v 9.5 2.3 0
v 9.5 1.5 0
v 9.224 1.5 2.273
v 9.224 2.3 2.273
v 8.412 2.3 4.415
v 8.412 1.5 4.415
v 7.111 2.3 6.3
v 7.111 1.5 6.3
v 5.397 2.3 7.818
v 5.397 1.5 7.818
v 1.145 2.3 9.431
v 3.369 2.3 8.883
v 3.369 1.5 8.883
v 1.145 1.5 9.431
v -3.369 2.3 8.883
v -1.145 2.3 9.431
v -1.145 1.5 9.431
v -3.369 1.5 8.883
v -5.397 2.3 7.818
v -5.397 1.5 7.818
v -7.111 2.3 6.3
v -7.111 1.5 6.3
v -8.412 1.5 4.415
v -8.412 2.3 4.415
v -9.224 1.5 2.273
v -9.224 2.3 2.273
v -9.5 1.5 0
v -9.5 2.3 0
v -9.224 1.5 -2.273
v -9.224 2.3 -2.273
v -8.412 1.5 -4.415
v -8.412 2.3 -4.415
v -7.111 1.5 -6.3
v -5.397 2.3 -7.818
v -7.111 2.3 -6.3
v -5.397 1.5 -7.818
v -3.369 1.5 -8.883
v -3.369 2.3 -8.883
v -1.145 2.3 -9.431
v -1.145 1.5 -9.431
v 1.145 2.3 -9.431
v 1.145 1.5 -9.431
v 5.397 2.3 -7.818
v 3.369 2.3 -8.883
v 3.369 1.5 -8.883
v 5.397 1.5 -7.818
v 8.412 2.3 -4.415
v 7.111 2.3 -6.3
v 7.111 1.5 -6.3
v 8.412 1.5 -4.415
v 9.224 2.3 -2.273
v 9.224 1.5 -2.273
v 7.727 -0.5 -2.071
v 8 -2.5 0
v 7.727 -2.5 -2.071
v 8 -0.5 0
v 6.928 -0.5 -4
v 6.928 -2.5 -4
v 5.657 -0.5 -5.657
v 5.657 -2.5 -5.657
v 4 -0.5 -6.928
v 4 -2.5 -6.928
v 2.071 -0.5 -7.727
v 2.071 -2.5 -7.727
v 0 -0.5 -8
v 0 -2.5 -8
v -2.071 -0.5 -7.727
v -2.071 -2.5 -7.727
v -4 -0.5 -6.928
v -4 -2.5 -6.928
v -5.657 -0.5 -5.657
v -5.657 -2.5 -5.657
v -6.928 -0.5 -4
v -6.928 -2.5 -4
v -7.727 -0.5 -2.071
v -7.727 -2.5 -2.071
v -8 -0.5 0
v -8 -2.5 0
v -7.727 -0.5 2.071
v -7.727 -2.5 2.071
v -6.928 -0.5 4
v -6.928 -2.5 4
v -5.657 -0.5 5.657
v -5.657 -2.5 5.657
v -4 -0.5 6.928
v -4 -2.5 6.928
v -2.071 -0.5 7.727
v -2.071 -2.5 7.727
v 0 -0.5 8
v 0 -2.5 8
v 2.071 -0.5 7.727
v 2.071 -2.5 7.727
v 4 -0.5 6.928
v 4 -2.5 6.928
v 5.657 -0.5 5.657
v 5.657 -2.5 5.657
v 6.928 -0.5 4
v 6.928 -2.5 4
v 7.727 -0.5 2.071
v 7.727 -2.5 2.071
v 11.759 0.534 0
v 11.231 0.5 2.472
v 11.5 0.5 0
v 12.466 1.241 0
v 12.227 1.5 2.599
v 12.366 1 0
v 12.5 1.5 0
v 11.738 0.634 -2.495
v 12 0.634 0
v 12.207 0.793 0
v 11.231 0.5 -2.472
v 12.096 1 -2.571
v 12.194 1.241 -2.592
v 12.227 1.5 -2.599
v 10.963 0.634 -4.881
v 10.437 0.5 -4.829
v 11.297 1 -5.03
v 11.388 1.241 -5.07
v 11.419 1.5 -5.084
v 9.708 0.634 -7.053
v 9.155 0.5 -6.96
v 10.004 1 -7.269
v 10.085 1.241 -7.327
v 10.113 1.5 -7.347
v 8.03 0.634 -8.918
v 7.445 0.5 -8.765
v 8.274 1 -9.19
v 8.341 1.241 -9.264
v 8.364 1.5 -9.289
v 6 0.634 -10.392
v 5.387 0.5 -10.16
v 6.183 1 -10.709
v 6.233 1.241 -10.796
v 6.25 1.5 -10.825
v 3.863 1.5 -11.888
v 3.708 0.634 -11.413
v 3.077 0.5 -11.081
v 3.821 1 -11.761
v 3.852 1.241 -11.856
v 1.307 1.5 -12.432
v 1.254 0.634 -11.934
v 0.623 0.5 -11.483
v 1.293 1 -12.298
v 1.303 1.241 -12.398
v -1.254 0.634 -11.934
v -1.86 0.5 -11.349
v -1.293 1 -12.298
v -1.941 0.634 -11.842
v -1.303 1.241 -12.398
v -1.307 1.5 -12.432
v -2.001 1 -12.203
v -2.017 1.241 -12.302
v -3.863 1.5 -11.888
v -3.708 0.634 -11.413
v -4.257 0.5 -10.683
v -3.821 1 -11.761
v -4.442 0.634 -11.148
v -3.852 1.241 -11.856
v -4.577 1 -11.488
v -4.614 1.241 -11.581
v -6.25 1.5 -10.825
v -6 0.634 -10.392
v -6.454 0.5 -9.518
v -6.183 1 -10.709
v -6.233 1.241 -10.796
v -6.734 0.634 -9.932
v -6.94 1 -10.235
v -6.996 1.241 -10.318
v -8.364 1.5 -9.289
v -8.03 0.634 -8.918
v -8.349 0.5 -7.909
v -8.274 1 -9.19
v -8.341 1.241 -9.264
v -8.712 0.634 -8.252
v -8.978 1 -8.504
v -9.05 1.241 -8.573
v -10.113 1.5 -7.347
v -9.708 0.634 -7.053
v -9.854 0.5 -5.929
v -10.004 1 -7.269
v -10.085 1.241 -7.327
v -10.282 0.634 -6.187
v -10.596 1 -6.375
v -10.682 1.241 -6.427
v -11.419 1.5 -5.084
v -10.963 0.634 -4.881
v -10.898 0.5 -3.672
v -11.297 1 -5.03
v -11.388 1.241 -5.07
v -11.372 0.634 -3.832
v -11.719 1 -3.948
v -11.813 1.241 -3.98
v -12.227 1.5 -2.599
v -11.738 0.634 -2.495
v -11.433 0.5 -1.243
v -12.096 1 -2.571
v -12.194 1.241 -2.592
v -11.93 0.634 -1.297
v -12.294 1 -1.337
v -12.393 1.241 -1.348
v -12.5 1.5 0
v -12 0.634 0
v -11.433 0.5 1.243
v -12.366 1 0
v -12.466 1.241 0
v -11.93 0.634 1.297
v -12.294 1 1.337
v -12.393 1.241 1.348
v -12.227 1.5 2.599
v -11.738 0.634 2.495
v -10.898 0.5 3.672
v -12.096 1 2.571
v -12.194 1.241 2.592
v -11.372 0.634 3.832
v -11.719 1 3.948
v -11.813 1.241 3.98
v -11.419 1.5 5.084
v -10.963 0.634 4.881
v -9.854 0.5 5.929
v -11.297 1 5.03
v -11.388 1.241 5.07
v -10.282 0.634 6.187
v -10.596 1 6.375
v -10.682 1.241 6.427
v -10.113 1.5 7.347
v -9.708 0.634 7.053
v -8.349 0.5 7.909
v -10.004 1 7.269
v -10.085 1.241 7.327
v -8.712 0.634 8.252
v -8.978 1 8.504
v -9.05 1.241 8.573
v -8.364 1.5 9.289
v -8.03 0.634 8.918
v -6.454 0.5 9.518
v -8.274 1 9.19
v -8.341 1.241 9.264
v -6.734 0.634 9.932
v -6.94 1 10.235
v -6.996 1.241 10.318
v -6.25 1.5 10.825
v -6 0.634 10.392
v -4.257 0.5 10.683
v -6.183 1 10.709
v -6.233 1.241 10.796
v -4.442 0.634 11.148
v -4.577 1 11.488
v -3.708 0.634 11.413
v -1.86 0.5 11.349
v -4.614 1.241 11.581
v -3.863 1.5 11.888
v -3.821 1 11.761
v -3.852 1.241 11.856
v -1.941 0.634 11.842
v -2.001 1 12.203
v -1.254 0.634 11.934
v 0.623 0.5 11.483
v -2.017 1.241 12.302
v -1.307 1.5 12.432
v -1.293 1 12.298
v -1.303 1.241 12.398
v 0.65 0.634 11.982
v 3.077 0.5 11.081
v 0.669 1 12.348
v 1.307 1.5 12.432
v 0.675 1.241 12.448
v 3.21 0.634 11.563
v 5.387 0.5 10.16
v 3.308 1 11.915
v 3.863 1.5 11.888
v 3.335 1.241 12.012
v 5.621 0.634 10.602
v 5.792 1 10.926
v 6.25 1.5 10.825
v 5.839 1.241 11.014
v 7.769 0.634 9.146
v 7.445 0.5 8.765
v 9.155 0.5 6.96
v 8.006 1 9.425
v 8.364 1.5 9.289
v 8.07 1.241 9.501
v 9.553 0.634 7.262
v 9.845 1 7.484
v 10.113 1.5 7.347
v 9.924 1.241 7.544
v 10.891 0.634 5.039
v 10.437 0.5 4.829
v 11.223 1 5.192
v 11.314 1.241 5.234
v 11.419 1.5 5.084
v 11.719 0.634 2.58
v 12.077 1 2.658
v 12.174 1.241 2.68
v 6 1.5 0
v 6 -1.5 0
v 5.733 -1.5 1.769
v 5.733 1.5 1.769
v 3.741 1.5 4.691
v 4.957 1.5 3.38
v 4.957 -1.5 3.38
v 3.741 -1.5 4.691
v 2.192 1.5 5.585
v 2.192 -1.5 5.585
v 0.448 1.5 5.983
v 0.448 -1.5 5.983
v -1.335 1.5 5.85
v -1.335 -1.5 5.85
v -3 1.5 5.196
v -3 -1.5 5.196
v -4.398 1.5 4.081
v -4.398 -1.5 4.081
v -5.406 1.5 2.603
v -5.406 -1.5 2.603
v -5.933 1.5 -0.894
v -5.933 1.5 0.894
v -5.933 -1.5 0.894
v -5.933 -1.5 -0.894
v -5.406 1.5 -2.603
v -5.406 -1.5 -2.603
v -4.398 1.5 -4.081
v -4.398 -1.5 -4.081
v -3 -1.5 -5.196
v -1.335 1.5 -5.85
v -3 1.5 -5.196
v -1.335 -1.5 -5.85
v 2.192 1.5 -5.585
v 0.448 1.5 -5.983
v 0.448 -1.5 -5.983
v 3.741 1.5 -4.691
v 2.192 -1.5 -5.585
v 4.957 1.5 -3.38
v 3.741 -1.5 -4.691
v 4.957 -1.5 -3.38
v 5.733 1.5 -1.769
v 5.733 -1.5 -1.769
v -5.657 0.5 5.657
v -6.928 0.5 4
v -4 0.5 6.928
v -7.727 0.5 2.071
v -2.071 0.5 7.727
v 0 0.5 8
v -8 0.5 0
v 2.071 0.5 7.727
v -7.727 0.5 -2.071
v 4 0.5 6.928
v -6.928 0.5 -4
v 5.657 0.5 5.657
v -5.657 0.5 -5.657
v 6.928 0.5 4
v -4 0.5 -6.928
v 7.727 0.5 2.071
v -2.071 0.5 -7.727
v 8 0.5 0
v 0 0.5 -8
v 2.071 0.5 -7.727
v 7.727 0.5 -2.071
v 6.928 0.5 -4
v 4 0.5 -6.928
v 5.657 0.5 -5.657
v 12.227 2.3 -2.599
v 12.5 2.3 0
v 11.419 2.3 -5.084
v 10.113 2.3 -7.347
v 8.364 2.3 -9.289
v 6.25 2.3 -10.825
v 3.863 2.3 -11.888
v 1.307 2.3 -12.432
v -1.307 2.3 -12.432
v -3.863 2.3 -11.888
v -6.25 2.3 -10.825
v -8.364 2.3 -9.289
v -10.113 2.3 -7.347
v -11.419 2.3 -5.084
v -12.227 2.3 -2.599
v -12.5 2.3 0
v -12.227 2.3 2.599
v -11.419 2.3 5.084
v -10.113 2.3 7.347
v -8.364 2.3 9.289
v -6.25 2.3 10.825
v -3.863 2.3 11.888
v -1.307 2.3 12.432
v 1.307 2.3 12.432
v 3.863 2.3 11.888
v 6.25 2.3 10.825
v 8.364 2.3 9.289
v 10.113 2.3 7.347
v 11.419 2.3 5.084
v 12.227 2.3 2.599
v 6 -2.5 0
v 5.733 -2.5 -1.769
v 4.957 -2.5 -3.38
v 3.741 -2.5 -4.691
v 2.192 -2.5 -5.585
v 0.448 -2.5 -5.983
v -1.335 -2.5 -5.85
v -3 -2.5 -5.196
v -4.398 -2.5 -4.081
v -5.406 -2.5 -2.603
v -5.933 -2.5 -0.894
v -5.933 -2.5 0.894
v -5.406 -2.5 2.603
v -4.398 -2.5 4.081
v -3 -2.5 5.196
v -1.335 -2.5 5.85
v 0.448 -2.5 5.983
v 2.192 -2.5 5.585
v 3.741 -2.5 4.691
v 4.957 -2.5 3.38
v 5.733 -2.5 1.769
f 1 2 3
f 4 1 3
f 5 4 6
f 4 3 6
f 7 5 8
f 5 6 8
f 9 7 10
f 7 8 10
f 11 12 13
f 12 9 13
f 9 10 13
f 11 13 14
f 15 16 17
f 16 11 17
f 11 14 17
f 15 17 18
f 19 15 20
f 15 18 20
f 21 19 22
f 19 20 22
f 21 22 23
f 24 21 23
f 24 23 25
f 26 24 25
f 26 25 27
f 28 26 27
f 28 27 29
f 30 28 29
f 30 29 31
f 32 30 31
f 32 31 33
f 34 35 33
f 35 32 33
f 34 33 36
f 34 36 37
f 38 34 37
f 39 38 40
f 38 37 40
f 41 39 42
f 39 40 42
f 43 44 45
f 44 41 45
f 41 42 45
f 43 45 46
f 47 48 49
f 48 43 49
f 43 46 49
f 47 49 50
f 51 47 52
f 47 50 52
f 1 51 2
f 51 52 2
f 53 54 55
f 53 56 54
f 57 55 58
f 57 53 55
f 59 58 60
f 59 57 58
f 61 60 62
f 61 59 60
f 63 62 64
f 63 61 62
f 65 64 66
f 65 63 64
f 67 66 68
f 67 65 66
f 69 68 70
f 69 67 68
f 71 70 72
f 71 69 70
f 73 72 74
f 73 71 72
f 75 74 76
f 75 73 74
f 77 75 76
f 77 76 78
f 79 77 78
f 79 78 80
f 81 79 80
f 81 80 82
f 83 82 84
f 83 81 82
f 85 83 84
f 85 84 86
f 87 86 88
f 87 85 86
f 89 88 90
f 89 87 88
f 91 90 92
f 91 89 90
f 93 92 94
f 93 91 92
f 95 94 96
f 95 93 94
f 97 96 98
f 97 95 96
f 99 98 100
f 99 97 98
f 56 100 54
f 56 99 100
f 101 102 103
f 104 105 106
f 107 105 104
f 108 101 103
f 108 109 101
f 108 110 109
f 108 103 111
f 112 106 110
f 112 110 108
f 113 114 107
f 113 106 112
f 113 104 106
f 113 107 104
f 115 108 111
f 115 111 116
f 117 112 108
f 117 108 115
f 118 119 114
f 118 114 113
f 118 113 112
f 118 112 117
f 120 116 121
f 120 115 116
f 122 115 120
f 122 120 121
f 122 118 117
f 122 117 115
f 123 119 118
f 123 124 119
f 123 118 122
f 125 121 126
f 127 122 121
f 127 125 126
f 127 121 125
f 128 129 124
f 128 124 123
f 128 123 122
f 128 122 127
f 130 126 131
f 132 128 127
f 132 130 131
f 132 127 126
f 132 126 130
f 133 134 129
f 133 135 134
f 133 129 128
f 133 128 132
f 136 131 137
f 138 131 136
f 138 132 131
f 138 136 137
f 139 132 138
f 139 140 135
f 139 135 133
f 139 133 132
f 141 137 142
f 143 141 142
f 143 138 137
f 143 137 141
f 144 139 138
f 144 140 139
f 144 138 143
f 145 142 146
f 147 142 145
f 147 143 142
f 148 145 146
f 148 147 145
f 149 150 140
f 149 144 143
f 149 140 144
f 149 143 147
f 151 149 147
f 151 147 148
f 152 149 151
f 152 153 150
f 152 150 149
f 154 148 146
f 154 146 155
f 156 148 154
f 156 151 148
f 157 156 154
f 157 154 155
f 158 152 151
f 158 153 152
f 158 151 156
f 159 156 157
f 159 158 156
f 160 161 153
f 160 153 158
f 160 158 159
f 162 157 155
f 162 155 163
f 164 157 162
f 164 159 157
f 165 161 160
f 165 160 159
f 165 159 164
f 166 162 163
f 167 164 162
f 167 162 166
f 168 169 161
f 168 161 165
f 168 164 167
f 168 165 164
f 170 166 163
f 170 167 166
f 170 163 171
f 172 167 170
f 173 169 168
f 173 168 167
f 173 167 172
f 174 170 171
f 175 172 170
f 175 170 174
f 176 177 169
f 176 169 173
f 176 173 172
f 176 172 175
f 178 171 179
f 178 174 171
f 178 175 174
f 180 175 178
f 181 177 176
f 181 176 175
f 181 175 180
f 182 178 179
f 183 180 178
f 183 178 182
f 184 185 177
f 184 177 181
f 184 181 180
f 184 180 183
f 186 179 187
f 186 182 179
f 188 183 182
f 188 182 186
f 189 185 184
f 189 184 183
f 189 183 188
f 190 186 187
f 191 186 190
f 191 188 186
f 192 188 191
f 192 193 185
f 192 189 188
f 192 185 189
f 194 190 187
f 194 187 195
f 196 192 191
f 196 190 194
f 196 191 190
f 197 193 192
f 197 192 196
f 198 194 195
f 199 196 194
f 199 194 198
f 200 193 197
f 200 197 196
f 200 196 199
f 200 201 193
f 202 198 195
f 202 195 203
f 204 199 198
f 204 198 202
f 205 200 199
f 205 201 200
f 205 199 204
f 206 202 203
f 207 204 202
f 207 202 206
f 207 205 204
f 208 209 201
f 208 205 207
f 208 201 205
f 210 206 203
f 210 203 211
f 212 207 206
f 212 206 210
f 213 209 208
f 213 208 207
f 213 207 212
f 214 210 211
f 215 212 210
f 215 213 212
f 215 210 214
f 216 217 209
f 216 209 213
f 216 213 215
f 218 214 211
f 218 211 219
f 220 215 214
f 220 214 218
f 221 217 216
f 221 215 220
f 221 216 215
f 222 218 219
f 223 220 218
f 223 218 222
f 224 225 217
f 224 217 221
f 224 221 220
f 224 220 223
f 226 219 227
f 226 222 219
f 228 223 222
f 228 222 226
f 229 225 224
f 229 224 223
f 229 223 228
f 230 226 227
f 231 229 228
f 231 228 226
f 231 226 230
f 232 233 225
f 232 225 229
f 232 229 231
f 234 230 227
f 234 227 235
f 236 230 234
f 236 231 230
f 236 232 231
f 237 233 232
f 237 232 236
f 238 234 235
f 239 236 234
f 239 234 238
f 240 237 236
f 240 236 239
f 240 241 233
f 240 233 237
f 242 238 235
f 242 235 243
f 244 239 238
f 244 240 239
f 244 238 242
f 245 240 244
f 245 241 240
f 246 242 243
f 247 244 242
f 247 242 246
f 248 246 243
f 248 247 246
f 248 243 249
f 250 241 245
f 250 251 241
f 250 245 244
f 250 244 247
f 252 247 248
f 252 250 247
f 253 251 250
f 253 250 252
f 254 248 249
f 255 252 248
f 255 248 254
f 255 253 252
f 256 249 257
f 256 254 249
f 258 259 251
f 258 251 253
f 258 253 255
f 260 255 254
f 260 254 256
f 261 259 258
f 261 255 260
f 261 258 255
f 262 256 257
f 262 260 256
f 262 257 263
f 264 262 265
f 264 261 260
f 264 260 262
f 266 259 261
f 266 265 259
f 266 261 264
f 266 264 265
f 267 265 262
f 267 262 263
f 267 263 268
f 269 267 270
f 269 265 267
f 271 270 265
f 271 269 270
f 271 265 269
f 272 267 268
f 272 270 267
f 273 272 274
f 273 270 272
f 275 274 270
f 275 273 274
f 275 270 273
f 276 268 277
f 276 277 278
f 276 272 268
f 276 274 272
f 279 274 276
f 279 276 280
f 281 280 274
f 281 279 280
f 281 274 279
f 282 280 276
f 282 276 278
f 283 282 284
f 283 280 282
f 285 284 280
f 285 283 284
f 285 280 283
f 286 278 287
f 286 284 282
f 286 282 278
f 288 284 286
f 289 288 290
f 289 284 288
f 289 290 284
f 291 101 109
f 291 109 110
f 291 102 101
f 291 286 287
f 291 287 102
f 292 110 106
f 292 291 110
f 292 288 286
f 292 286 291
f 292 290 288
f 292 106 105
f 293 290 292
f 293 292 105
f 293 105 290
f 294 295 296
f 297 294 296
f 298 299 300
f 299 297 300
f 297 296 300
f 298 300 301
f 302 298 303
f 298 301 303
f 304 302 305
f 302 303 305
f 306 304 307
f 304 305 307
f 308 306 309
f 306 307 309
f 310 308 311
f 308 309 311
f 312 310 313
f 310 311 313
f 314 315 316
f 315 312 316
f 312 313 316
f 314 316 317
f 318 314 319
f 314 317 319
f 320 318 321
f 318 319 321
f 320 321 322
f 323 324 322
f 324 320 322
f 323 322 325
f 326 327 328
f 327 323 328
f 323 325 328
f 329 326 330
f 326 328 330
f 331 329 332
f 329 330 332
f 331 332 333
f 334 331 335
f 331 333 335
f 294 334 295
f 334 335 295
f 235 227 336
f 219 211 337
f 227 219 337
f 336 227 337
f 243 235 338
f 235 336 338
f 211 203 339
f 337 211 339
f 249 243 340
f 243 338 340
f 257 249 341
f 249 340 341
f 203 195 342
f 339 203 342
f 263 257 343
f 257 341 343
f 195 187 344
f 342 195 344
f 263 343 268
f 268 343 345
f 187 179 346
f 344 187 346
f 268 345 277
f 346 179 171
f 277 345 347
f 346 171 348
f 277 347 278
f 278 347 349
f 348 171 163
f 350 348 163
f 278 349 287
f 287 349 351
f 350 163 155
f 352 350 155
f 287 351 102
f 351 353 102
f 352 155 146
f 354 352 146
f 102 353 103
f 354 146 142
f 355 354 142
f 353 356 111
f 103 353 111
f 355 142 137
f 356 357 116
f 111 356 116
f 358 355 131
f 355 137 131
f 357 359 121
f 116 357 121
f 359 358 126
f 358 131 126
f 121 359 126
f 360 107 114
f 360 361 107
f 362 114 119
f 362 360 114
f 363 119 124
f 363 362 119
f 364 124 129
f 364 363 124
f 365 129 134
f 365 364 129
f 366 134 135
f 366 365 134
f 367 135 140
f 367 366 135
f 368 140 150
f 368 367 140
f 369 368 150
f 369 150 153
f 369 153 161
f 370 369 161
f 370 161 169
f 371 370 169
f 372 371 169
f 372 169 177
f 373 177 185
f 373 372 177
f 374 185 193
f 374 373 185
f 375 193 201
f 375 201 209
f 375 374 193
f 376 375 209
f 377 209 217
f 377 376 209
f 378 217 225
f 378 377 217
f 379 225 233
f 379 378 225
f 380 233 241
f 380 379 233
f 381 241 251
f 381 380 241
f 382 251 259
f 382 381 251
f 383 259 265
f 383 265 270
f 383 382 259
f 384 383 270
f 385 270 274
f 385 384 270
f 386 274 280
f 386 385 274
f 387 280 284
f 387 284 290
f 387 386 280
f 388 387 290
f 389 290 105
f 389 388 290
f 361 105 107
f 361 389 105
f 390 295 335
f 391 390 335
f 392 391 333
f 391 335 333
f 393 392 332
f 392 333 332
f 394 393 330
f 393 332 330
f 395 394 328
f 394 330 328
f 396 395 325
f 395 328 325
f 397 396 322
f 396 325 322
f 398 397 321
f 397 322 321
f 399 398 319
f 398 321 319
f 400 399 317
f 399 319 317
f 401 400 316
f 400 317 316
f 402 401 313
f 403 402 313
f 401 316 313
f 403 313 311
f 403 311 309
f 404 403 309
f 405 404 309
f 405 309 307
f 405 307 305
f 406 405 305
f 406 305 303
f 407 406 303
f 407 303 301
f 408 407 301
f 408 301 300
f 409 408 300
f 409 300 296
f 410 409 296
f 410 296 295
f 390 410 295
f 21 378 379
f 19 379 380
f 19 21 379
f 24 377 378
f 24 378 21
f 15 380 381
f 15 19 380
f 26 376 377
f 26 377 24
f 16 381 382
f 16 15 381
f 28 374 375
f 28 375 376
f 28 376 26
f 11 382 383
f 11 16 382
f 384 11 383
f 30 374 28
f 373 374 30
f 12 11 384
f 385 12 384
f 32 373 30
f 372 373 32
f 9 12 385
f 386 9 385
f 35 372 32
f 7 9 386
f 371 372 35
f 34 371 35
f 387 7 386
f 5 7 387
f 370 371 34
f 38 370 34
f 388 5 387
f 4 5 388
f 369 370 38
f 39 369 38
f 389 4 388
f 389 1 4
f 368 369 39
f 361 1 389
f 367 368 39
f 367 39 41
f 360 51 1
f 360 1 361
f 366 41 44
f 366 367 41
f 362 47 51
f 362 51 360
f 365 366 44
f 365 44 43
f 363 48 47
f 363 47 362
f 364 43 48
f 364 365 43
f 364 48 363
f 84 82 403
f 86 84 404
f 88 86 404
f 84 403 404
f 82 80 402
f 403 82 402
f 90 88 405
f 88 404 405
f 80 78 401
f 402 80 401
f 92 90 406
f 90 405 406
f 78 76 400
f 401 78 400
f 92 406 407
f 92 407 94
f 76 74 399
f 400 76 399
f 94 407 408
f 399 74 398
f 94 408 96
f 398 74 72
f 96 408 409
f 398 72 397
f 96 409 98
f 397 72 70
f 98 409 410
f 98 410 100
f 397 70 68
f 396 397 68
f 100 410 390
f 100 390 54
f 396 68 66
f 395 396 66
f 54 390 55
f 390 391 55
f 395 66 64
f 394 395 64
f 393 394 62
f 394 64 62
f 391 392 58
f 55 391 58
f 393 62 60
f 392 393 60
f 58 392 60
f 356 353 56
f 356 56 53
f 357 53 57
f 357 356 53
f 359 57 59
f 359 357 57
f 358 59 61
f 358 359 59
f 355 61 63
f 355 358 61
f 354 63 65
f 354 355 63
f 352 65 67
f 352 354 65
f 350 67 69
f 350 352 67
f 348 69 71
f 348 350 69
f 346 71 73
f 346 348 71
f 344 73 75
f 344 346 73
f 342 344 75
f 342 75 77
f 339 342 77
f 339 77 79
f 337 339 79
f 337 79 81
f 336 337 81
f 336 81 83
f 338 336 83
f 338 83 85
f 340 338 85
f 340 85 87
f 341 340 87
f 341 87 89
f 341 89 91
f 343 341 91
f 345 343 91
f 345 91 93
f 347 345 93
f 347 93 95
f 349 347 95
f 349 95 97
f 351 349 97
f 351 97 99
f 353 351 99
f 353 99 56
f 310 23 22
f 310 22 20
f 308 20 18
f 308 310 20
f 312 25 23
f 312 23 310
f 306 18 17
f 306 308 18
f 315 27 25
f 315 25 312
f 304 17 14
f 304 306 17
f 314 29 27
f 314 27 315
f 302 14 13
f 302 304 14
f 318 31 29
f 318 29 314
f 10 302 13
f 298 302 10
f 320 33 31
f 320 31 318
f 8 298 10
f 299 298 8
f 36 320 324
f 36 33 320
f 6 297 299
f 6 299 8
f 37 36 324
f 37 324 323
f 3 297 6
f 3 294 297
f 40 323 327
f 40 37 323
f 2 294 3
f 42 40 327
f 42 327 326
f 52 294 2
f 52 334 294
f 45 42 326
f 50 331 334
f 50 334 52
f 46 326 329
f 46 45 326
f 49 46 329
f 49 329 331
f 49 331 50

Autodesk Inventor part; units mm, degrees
ref_plane "YZ Plane" through (0, 0, 0) normal (1, 0, 0) x (0, 1, 0)
ref_plane "XZ Plane" through (0, 0, 0) normal (0, 1, 0) x (-1, 0, 0)
ref_plane "XY Plane" through (0, 0, 0) normal (0, 0, 1) x (1, 0, 0)
sketch "Sketch1" plane through (0, 0, 0) normal (0, 0, 1) x (1, 0, 0)
  line L0 (6, 1.5) -> (6, -1.5)
  line L1 (8, 0.5) -> (11.5, 0.5)
  line L2 (12.5, 1.5) -> (12.5, 2.3)
  line L3 (12.5, 1.5) -> (11.5, 1.5) construction
  line L4 (11.5, 1.5) -> (11.5, 0.5) construction
  arc A0 (11.5, 0.5) -> (12.5, 1.5) centre (11.5, 1.5) ccw
  line L5 (6, 1.5) -> (9.5, 1.5)
  line L6 (12.5, 2.3) -> (9.5, 2.3)
  line L7 (9.5, 2.3) -> (9.5, 1.5)
  line L8 (8, -0.5) -> (8, 0.5)
  line L9 (6, -2.5) -> (8, -2.5)
  line L10 (8, -2.5) -> (8, -0.5)
  line L11 (0, 0) -> (0, 11.9081) construction
  line L12 (6, -2.5) -> (6, -1.5)
  dimension "d0" = 3
  dimension "d1" = 1.5
  dimension "d2" = 0.8
  dimension "d3" = 1
  dimension "d4" = 1
  dimension "d5" = 3
  dimension "d6" = 6
  dimension "d7" = 0.8
  dimension "d8" = 3.5
  dimension "d11" = 1
revolve "Revolution1" add sketch "Sketch1" angle 360 about axis through (0, 0, 0) along (0, 1, 0)
equation "\"d1\" = 0.5 * d0"
equation "\"d4\" = d3"
properties part number "tarcza sprzęgła 2"
